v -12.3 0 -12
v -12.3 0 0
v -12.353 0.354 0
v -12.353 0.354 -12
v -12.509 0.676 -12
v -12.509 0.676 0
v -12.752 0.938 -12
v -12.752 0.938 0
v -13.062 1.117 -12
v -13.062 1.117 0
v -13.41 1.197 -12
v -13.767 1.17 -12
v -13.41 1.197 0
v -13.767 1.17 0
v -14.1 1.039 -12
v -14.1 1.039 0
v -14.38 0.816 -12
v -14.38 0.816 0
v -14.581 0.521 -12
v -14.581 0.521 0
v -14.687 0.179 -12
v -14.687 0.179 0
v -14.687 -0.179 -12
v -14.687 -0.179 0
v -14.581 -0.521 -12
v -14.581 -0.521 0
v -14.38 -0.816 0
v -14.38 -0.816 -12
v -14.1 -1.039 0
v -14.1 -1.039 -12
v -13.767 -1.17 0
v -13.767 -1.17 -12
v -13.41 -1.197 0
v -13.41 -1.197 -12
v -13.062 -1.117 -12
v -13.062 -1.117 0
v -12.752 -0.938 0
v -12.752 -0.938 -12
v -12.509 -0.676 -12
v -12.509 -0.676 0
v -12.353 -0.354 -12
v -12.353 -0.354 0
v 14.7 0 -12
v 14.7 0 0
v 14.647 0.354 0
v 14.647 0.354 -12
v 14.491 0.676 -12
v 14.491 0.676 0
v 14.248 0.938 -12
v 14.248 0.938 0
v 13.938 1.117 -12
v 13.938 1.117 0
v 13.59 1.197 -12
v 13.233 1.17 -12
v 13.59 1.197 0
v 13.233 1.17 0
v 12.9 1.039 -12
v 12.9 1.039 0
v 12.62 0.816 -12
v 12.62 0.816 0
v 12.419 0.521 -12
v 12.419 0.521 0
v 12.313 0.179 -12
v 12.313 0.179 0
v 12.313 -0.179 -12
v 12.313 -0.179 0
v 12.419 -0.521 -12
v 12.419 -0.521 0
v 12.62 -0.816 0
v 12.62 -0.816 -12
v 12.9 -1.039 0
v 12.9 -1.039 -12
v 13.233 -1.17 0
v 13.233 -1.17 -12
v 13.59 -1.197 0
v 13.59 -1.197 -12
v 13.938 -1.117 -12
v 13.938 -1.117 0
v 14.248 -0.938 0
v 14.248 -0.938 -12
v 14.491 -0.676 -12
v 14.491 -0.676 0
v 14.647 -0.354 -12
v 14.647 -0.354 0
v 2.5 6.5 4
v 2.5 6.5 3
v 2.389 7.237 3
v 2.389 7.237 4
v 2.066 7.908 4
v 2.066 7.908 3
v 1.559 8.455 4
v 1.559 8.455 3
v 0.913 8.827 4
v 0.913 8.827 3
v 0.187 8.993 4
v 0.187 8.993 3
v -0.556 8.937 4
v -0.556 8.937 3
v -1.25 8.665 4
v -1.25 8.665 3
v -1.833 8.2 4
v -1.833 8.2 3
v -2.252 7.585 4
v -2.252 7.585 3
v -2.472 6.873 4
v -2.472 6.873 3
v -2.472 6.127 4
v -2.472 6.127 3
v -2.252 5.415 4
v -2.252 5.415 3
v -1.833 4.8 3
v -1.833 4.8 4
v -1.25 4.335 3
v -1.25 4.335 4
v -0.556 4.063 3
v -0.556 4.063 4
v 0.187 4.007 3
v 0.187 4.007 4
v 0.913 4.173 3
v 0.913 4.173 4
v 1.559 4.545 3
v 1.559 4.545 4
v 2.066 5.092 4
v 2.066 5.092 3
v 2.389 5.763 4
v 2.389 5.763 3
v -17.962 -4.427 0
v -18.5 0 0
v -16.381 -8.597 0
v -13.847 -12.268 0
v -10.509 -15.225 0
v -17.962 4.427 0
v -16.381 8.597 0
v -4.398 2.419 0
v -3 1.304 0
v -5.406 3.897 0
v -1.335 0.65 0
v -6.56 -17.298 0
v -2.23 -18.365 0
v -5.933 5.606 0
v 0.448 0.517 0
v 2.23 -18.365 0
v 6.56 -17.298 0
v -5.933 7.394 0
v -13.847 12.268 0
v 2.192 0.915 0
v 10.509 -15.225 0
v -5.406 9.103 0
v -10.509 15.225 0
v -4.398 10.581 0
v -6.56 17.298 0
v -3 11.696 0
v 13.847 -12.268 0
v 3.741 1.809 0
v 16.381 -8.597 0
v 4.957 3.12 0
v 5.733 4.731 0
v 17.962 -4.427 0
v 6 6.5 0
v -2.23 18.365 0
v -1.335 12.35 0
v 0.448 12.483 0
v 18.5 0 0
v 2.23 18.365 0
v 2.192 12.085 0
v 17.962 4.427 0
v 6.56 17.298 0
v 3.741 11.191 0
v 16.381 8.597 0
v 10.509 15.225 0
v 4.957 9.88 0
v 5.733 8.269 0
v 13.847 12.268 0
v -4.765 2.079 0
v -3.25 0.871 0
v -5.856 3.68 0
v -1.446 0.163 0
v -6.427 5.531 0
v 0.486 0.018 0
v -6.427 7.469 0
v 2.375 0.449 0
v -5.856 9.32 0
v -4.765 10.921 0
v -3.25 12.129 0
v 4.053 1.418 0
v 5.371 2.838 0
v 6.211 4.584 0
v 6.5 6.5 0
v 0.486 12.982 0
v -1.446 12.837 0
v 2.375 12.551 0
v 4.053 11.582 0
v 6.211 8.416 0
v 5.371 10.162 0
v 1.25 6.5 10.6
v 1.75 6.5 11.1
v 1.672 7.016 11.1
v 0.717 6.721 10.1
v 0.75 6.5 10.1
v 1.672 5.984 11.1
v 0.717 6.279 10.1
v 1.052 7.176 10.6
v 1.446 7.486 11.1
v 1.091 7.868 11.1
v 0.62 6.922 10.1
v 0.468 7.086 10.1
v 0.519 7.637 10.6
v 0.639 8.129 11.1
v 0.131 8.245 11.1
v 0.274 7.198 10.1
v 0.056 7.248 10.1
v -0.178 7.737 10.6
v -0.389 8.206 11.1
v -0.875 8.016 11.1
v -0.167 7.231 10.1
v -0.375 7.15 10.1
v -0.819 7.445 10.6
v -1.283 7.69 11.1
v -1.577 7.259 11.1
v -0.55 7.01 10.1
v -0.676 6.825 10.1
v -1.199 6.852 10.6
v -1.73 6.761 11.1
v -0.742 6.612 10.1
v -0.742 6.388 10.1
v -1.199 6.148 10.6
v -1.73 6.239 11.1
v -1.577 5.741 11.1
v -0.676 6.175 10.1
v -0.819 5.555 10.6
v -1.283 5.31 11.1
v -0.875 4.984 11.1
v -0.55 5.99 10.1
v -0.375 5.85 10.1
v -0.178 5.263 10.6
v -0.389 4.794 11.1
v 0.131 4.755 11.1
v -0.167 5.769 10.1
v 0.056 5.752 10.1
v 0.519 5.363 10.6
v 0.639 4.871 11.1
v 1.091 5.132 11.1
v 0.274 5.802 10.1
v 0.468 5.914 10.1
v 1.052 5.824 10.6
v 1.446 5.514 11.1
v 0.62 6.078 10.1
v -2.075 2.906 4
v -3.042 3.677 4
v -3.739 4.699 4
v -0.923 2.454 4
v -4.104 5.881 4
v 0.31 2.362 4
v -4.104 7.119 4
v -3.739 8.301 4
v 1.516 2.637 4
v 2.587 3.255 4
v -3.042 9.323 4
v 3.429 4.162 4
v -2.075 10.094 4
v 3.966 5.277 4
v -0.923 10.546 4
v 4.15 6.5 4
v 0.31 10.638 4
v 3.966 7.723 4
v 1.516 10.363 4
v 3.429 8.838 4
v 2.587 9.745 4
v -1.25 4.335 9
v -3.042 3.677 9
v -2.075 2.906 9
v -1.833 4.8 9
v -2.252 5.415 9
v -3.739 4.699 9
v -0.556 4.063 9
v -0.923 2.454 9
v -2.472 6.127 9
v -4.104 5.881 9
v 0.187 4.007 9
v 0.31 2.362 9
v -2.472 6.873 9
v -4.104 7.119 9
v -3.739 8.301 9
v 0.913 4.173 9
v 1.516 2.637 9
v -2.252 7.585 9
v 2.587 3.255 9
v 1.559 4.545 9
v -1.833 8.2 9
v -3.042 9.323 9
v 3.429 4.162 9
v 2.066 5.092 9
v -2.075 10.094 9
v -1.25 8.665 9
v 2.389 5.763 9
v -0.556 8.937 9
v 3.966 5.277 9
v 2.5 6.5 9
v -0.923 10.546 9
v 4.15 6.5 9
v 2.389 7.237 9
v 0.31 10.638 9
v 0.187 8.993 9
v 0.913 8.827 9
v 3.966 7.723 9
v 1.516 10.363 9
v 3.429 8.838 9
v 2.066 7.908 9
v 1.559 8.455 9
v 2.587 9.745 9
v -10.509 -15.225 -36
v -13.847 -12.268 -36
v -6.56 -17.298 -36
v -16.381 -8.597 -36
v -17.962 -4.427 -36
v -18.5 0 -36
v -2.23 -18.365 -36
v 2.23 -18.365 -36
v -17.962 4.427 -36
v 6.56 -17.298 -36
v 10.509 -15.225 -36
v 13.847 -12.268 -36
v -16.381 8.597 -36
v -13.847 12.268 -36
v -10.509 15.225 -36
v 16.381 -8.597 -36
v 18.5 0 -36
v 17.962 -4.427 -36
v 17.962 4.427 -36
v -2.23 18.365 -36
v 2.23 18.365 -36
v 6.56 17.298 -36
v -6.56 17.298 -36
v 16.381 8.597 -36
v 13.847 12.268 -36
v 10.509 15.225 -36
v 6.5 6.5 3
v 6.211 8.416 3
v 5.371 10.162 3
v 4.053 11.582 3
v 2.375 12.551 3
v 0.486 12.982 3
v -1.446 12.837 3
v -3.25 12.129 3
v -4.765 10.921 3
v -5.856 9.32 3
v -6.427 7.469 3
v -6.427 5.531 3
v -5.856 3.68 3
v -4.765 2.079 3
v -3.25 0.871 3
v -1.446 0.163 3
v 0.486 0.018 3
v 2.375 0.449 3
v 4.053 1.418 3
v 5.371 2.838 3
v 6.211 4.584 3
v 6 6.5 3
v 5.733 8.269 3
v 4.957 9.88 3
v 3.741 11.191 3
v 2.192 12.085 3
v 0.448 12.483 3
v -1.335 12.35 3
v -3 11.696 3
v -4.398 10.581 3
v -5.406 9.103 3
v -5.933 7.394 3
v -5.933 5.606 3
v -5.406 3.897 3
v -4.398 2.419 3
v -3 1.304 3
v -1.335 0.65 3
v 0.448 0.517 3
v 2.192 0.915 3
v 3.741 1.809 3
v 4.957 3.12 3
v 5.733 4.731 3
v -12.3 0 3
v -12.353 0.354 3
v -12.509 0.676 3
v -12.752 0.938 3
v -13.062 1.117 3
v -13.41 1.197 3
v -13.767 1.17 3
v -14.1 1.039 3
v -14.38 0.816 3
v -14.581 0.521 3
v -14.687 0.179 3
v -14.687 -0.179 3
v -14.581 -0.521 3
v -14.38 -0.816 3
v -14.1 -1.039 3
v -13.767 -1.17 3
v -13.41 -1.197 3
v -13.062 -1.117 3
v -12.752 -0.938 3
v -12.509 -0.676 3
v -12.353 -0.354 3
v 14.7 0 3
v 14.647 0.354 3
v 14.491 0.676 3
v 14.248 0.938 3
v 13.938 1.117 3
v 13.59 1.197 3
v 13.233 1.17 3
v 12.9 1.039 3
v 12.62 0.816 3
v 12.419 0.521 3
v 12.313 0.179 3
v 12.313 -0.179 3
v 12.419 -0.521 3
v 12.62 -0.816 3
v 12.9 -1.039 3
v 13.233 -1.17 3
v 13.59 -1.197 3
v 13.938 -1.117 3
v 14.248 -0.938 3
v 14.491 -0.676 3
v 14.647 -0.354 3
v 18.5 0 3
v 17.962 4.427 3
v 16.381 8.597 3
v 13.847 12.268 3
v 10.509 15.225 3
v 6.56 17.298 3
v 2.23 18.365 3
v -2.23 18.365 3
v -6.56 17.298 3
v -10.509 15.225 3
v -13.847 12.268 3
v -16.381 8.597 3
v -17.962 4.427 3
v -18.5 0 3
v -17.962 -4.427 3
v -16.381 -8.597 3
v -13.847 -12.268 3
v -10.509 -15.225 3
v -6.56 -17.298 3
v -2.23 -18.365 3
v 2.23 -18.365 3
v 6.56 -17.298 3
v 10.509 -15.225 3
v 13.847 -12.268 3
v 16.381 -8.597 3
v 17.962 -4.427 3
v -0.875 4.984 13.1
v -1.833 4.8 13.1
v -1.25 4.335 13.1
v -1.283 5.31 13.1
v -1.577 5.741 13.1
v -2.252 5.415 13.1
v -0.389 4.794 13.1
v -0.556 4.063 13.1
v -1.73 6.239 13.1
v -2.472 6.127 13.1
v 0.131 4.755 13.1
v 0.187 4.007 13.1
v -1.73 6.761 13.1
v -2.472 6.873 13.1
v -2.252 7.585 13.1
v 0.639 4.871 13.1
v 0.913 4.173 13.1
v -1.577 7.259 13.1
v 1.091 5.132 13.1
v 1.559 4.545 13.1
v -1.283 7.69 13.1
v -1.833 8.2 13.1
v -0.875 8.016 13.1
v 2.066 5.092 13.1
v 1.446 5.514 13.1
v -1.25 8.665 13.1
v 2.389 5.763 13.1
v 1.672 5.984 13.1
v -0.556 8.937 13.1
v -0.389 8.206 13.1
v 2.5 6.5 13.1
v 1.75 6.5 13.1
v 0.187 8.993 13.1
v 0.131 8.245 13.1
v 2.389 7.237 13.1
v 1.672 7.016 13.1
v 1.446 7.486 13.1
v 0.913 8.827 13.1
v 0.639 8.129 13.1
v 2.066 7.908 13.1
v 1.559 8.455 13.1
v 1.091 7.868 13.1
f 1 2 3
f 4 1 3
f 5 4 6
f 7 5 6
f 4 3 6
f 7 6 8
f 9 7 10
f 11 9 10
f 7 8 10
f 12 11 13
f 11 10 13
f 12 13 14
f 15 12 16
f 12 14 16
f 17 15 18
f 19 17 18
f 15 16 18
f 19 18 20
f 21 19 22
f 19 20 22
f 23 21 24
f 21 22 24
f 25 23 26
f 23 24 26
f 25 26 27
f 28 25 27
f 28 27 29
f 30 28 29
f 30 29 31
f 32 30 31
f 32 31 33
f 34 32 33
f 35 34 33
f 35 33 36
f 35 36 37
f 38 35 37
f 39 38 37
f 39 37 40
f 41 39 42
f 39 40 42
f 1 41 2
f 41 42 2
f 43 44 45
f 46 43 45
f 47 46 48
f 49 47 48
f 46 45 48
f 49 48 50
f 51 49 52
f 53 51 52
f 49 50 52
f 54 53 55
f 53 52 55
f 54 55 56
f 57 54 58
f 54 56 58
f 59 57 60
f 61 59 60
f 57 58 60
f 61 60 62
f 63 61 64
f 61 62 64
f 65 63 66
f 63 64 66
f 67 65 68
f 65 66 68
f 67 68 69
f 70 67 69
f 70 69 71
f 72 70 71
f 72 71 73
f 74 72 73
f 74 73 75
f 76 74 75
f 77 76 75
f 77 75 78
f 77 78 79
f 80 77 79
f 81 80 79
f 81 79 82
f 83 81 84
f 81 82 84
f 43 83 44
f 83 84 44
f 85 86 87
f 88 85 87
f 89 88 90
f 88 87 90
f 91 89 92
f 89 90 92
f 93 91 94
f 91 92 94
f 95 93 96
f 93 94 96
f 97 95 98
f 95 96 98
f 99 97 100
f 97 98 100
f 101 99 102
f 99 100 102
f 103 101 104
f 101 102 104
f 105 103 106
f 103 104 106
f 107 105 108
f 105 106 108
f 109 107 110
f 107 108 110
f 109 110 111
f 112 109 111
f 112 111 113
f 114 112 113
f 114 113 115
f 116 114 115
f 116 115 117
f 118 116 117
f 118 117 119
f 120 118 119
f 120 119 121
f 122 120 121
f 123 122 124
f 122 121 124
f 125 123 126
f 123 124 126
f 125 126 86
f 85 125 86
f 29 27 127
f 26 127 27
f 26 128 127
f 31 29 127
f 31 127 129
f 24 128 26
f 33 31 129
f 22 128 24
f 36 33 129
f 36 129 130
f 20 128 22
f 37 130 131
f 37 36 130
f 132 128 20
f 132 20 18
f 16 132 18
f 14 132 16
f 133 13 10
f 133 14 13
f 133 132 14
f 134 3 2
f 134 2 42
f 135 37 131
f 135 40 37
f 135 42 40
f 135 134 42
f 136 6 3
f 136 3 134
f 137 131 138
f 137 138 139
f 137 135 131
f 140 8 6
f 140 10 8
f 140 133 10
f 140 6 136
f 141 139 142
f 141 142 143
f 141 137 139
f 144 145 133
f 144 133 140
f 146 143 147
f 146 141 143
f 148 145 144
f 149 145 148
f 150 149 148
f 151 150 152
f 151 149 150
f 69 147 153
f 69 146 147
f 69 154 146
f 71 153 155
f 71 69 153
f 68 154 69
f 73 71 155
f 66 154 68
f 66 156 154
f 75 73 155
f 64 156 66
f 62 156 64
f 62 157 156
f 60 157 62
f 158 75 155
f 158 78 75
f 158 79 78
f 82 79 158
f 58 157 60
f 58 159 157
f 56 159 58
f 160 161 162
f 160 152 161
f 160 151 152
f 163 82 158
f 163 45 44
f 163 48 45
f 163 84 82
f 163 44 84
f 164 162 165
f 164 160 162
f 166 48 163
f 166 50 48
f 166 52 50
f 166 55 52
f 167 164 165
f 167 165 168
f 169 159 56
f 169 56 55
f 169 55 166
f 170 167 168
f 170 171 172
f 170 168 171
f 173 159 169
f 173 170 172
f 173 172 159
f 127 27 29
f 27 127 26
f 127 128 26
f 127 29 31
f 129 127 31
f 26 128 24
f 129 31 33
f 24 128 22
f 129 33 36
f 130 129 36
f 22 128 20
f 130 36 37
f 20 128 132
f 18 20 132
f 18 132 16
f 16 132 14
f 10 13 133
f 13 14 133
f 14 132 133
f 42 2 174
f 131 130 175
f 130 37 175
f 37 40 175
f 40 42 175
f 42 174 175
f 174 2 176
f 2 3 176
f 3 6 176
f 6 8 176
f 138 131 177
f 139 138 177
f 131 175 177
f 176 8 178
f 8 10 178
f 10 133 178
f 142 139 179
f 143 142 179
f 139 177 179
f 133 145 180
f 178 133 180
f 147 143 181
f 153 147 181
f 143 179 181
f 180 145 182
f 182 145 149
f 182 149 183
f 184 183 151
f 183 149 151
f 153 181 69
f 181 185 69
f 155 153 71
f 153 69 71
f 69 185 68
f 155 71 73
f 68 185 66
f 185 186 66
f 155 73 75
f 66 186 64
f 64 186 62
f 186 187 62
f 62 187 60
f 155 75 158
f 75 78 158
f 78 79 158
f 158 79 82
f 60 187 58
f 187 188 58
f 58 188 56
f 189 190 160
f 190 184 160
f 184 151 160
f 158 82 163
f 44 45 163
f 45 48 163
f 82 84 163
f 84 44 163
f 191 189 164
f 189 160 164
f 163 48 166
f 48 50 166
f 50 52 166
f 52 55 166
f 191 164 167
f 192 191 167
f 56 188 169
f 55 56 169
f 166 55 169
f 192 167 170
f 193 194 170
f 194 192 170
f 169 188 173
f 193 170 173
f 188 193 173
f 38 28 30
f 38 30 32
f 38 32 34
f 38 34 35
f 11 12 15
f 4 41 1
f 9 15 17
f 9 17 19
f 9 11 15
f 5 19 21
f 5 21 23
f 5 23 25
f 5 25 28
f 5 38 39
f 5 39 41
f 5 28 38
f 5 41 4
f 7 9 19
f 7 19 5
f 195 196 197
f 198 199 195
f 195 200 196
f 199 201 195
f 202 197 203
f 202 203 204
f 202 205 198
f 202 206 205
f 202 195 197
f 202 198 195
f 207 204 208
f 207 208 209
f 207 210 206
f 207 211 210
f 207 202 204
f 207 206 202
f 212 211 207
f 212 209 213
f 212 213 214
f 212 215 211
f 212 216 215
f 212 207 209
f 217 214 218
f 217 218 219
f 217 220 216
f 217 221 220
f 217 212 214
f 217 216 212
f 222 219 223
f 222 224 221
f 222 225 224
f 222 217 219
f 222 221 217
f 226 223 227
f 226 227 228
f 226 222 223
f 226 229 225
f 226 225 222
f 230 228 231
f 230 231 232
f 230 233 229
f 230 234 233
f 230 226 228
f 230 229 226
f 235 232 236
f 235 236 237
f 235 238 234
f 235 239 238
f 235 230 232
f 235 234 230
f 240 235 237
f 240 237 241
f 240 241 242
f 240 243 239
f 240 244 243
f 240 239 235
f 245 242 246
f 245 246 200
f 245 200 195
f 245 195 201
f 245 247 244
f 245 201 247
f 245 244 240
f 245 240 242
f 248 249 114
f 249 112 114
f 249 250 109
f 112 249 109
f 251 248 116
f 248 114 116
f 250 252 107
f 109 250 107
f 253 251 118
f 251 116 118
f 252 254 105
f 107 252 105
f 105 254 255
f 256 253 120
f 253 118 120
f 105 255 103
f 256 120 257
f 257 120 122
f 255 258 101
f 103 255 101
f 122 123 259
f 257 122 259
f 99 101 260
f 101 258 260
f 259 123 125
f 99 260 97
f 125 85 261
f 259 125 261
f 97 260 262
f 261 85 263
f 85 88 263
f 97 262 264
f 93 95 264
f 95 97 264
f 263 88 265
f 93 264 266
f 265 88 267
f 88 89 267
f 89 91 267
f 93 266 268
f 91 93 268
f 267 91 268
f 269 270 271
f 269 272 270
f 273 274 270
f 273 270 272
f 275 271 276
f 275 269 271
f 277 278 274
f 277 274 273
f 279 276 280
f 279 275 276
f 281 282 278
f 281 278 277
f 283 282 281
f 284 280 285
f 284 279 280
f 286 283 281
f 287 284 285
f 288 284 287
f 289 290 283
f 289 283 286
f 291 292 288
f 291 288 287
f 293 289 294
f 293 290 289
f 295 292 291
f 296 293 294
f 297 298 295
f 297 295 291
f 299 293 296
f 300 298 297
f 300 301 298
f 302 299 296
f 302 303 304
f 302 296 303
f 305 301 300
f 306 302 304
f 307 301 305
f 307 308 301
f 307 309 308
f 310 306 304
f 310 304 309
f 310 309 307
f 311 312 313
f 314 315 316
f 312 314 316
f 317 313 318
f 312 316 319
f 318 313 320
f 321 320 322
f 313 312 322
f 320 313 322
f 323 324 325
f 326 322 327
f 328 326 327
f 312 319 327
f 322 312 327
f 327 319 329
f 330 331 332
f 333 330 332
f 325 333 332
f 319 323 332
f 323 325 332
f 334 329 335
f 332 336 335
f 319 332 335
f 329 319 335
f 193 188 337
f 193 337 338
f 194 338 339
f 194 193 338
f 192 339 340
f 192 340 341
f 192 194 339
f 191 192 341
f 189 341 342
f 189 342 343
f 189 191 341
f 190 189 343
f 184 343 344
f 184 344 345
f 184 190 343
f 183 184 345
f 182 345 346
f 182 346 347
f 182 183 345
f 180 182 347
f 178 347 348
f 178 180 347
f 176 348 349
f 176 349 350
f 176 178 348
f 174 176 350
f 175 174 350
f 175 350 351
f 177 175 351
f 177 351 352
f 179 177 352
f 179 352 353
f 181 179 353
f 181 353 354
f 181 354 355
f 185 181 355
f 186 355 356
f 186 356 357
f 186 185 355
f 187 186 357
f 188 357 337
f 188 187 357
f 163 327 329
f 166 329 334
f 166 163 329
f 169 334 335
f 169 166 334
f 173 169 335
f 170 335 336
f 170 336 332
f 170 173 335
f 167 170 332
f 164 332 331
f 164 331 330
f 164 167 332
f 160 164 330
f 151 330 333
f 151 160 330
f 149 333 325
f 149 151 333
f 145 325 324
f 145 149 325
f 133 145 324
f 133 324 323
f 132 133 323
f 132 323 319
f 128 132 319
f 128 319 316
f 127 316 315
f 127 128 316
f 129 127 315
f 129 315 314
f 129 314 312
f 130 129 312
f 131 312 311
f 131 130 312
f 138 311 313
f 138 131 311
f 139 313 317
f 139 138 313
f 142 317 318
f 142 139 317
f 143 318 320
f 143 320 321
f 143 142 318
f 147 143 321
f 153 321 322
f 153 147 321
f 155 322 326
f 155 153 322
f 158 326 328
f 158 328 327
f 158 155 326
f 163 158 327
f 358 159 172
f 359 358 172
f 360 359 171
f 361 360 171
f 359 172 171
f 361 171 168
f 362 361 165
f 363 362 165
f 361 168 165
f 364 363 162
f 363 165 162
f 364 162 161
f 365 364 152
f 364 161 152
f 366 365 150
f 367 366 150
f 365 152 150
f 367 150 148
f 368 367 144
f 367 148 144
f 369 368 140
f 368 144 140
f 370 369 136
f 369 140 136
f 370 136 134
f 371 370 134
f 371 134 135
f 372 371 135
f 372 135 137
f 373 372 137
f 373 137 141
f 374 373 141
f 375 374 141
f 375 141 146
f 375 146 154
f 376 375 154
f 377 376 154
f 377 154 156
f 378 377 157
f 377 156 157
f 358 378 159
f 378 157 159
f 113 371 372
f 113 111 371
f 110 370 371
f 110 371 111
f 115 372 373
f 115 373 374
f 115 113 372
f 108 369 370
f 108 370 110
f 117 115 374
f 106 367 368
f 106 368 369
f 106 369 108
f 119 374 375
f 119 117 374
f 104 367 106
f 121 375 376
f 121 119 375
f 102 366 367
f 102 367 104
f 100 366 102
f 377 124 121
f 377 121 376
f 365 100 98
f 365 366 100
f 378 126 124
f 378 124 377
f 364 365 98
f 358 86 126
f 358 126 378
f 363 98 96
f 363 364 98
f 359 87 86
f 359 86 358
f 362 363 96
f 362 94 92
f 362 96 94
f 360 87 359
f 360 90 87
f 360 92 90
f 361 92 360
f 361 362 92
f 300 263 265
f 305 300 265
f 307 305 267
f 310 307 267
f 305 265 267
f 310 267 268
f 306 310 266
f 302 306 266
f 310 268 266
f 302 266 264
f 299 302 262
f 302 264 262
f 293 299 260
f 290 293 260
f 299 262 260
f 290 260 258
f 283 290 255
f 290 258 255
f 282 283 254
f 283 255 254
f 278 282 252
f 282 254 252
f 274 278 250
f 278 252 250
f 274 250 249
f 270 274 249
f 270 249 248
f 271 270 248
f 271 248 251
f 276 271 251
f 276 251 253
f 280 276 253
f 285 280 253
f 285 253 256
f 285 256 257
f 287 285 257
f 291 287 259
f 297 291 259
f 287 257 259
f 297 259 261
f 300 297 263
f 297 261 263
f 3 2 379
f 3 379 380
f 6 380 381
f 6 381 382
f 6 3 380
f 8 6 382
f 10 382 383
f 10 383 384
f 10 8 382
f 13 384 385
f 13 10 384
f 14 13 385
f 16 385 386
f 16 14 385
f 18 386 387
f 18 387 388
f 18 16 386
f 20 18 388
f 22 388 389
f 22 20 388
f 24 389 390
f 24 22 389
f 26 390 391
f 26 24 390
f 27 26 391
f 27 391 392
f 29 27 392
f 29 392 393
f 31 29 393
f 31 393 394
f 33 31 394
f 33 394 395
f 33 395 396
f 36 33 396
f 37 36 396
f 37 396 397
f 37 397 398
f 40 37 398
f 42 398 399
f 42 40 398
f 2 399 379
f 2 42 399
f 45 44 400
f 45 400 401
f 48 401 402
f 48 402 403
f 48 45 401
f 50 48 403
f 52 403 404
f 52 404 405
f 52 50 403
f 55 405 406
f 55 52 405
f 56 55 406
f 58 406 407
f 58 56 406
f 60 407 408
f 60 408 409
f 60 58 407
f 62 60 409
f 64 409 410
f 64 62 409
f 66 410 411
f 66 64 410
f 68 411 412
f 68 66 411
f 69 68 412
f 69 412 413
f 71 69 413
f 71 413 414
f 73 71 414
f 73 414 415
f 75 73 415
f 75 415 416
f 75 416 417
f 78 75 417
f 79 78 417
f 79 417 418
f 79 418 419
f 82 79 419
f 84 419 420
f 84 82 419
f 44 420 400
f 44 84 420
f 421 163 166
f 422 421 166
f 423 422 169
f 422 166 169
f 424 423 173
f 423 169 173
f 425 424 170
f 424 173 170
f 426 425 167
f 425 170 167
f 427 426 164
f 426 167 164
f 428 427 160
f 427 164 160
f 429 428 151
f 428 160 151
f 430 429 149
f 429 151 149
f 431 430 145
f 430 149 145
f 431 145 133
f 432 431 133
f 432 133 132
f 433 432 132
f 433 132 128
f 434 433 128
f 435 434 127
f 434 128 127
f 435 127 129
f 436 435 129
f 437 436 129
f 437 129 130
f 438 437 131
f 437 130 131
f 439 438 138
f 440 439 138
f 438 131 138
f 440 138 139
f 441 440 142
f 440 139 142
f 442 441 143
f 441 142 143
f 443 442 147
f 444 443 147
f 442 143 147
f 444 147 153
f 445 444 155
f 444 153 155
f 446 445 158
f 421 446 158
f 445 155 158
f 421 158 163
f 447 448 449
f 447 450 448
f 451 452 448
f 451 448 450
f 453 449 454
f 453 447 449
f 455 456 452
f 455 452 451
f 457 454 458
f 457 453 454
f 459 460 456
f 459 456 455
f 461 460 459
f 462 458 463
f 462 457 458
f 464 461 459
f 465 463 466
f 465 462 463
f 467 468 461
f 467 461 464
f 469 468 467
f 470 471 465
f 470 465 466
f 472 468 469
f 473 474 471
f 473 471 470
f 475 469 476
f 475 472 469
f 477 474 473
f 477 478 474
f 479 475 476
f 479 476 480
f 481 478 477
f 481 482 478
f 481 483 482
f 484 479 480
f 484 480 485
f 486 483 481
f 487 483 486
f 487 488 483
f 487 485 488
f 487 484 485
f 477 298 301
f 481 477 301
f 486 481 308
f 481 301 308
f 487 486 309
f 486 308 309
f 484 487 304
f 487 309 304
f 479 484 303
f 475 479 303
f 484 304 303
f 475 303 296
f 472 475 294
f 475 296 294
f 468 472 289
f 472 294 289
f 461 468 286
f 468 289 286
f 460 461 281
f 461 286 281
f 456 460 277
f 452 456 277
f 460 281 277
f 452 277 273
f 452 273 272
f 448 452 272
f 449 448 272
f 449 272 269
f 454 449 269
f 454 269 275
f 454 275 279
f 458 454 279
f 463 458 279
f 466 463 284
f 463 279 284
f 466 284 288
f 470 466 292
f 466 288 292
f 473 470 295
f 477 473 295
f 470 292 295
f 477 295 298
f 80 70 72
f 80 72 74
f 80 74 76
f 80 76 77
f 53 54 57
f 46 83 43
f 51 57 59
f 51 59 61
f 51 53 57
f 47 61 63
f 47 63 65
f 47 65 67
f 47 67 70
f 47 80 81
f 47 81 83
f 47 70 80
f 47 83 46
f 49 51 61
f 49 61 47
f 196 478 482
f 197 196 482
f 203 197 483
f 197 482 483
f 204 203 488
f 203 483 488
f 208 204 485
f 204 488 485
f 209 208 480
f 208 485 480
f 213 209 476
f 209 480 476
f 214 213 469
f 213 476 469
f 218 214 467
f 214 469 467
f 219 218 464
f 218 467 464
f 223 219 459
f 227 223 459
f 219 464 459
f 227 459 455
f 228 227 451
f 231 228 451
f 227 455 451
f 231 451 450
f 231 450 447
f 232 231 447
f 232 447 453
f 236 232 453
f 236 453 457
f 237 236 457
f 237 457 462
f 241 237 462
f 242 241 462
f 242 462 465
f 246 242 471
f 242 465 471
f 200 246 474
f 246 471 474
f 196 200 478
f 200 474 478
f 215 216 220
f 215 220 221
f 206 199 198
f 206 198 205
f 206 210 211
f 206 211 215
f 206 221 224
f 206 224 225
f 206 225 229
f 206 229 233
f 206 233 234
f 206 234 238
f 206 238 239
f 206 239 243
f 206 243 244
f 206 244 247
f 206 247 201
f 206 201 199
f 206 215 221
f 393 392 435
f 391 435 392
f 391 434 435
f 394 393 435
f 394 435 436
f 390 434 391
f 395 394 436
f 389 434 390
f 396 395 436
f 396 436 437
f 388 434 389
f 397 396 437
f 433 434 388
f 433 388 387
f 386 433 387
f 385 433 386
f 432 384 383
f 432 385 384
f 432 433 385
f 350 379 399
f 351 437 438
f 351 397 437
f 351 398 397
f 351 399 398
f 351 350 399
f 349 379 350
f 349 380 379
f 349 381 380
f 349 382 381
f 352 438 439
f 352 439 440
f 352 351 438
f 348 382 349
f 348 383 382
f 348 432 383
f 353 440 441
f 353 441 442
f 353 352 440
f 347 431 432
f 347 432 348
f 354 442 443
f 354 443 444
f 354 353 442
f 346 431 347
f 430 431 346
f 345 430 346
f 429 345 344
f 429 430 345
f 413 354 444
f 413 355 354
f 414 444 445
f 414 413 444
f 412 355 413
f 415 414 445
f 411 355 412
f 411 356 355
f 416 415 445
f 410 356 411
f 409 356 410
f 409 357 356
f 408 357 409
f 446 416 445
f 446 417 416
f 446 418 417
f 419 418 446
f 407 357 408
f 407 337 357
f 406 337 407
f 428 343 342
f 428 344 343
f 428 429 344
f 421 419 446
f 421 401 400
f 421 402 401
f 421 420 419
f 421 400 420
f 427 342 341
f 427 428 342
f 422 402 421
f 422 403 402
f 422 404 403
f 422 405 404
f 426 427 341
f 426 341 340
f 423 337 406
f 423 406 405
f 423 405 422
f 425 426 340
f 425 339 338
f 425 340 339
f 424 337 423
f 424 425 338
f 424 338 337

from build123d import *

# Parameters (mm, degrees)
F0_R      = 18.5
F1_DEPTH  = 36
F2_R      = 1.2
F3_DEPTH  = 12
F2_R_2    = 6
F4_DEPTH  = 3
F5_R      = 2.5
F6_DEPTH  = 1
F7_R      = 4.15
F7_R_2    = 2.5
F8_DEPTH  = 5
F9_R      = 2.5
F10_DEPTH = 4.1
F11_R     = 1.75
F12_DEPTH = 3
F13_SIZE  = 1
F14_R     = 18.5
F14_R_2   = 1.2
F14_R_3   = 6.5
F15_DEPTH = 3


with BuildPart() as f1:
    # F0 (on Top) → F1 (new body)
    with BuildSketch(Plane.XY):
        Circle(F0_R)
    extrude(amount=-F1_DEPTH)

    # F2 (on face) → F3 (cut)
    with BuildSketch(Plane.XY):
        with Locations((-13.5, 0)):
            Circle(F2_R)
        with Locations((13.5, 0)):
            Circle(F2_R)
    extrude(amount=-F3_DEPTH, mode=Mode.SUBTRACT)

    # F2 (on face) → F4 (join)
    with BuildSketch(Plane.XY):
        with Locations((0, 6.5)):
            Circle(F2_R_2)
    extrude(amount=F4_DEPTH)

    # F5 (on face) → F6 (join)
    with BuildSketch(Plane.XY.offset(3)):
        with Locations((0, 6.5)):
            Circle(F5_R)
    extrude(amount=F6_DEPTH)

    # F7 (on face) → F8 (join)
    with BuildSketch(Plane.XY.offset(4)):
        with Locations((0, 6.5)):
            Circle(F7_R)
        with Locations((0, 6.5)):
            Circle(F7_R_2, mode=Mode.SUBTRACT)
        with Locations((0, 6.5)):
            Circle(F7_R_2)
    extrude(amount=F8_DEPTH)

    # F9 (on face) → F10 (join)
    with BuildSketch(Plane.XY.offset(9)):
        with Locations((0, 6.5)):
            Circle(F9_R)
    extrude(amount=F10_DEPTH)

    # F11 (on face) → F12 (cut)
    with BuildSketch(Plane.XY.offset(13.1)):
        with Locations((0, 6.5)):
            Circle(F11_R)
    extrude(amount=-F12_DEPTH, mode=Mode.SUBTRACT)

    # F13
    f13_edges = [f1.edges().sort_by_distance(p)[0] for p in [
        (-1.75, 6.5, 10.1),
    ]]
    chamfer(f13_edges, length=F13_SIZE)


with BuildPart() as f15:
    # F14 (on face) → F15 (new body, through all)
    with BuildSketch(Plane.XY):
        Circle(F14_R)
        with Locations((-13.5, 0)):
            Circle(F14_R_2, mode=Mode.SUBTRACT)
        with Locations((0, 6.5)):
            Circle(F14_R_3, mode=Mode.SUBTRACT)
        with Locations((13.5, 0)):
            Circle(F14_R_2, mode=Mode.SUBTRACT)
    extrude(amount=F15_DEPTH)


solid = Compound([f1.part, f15.part])
